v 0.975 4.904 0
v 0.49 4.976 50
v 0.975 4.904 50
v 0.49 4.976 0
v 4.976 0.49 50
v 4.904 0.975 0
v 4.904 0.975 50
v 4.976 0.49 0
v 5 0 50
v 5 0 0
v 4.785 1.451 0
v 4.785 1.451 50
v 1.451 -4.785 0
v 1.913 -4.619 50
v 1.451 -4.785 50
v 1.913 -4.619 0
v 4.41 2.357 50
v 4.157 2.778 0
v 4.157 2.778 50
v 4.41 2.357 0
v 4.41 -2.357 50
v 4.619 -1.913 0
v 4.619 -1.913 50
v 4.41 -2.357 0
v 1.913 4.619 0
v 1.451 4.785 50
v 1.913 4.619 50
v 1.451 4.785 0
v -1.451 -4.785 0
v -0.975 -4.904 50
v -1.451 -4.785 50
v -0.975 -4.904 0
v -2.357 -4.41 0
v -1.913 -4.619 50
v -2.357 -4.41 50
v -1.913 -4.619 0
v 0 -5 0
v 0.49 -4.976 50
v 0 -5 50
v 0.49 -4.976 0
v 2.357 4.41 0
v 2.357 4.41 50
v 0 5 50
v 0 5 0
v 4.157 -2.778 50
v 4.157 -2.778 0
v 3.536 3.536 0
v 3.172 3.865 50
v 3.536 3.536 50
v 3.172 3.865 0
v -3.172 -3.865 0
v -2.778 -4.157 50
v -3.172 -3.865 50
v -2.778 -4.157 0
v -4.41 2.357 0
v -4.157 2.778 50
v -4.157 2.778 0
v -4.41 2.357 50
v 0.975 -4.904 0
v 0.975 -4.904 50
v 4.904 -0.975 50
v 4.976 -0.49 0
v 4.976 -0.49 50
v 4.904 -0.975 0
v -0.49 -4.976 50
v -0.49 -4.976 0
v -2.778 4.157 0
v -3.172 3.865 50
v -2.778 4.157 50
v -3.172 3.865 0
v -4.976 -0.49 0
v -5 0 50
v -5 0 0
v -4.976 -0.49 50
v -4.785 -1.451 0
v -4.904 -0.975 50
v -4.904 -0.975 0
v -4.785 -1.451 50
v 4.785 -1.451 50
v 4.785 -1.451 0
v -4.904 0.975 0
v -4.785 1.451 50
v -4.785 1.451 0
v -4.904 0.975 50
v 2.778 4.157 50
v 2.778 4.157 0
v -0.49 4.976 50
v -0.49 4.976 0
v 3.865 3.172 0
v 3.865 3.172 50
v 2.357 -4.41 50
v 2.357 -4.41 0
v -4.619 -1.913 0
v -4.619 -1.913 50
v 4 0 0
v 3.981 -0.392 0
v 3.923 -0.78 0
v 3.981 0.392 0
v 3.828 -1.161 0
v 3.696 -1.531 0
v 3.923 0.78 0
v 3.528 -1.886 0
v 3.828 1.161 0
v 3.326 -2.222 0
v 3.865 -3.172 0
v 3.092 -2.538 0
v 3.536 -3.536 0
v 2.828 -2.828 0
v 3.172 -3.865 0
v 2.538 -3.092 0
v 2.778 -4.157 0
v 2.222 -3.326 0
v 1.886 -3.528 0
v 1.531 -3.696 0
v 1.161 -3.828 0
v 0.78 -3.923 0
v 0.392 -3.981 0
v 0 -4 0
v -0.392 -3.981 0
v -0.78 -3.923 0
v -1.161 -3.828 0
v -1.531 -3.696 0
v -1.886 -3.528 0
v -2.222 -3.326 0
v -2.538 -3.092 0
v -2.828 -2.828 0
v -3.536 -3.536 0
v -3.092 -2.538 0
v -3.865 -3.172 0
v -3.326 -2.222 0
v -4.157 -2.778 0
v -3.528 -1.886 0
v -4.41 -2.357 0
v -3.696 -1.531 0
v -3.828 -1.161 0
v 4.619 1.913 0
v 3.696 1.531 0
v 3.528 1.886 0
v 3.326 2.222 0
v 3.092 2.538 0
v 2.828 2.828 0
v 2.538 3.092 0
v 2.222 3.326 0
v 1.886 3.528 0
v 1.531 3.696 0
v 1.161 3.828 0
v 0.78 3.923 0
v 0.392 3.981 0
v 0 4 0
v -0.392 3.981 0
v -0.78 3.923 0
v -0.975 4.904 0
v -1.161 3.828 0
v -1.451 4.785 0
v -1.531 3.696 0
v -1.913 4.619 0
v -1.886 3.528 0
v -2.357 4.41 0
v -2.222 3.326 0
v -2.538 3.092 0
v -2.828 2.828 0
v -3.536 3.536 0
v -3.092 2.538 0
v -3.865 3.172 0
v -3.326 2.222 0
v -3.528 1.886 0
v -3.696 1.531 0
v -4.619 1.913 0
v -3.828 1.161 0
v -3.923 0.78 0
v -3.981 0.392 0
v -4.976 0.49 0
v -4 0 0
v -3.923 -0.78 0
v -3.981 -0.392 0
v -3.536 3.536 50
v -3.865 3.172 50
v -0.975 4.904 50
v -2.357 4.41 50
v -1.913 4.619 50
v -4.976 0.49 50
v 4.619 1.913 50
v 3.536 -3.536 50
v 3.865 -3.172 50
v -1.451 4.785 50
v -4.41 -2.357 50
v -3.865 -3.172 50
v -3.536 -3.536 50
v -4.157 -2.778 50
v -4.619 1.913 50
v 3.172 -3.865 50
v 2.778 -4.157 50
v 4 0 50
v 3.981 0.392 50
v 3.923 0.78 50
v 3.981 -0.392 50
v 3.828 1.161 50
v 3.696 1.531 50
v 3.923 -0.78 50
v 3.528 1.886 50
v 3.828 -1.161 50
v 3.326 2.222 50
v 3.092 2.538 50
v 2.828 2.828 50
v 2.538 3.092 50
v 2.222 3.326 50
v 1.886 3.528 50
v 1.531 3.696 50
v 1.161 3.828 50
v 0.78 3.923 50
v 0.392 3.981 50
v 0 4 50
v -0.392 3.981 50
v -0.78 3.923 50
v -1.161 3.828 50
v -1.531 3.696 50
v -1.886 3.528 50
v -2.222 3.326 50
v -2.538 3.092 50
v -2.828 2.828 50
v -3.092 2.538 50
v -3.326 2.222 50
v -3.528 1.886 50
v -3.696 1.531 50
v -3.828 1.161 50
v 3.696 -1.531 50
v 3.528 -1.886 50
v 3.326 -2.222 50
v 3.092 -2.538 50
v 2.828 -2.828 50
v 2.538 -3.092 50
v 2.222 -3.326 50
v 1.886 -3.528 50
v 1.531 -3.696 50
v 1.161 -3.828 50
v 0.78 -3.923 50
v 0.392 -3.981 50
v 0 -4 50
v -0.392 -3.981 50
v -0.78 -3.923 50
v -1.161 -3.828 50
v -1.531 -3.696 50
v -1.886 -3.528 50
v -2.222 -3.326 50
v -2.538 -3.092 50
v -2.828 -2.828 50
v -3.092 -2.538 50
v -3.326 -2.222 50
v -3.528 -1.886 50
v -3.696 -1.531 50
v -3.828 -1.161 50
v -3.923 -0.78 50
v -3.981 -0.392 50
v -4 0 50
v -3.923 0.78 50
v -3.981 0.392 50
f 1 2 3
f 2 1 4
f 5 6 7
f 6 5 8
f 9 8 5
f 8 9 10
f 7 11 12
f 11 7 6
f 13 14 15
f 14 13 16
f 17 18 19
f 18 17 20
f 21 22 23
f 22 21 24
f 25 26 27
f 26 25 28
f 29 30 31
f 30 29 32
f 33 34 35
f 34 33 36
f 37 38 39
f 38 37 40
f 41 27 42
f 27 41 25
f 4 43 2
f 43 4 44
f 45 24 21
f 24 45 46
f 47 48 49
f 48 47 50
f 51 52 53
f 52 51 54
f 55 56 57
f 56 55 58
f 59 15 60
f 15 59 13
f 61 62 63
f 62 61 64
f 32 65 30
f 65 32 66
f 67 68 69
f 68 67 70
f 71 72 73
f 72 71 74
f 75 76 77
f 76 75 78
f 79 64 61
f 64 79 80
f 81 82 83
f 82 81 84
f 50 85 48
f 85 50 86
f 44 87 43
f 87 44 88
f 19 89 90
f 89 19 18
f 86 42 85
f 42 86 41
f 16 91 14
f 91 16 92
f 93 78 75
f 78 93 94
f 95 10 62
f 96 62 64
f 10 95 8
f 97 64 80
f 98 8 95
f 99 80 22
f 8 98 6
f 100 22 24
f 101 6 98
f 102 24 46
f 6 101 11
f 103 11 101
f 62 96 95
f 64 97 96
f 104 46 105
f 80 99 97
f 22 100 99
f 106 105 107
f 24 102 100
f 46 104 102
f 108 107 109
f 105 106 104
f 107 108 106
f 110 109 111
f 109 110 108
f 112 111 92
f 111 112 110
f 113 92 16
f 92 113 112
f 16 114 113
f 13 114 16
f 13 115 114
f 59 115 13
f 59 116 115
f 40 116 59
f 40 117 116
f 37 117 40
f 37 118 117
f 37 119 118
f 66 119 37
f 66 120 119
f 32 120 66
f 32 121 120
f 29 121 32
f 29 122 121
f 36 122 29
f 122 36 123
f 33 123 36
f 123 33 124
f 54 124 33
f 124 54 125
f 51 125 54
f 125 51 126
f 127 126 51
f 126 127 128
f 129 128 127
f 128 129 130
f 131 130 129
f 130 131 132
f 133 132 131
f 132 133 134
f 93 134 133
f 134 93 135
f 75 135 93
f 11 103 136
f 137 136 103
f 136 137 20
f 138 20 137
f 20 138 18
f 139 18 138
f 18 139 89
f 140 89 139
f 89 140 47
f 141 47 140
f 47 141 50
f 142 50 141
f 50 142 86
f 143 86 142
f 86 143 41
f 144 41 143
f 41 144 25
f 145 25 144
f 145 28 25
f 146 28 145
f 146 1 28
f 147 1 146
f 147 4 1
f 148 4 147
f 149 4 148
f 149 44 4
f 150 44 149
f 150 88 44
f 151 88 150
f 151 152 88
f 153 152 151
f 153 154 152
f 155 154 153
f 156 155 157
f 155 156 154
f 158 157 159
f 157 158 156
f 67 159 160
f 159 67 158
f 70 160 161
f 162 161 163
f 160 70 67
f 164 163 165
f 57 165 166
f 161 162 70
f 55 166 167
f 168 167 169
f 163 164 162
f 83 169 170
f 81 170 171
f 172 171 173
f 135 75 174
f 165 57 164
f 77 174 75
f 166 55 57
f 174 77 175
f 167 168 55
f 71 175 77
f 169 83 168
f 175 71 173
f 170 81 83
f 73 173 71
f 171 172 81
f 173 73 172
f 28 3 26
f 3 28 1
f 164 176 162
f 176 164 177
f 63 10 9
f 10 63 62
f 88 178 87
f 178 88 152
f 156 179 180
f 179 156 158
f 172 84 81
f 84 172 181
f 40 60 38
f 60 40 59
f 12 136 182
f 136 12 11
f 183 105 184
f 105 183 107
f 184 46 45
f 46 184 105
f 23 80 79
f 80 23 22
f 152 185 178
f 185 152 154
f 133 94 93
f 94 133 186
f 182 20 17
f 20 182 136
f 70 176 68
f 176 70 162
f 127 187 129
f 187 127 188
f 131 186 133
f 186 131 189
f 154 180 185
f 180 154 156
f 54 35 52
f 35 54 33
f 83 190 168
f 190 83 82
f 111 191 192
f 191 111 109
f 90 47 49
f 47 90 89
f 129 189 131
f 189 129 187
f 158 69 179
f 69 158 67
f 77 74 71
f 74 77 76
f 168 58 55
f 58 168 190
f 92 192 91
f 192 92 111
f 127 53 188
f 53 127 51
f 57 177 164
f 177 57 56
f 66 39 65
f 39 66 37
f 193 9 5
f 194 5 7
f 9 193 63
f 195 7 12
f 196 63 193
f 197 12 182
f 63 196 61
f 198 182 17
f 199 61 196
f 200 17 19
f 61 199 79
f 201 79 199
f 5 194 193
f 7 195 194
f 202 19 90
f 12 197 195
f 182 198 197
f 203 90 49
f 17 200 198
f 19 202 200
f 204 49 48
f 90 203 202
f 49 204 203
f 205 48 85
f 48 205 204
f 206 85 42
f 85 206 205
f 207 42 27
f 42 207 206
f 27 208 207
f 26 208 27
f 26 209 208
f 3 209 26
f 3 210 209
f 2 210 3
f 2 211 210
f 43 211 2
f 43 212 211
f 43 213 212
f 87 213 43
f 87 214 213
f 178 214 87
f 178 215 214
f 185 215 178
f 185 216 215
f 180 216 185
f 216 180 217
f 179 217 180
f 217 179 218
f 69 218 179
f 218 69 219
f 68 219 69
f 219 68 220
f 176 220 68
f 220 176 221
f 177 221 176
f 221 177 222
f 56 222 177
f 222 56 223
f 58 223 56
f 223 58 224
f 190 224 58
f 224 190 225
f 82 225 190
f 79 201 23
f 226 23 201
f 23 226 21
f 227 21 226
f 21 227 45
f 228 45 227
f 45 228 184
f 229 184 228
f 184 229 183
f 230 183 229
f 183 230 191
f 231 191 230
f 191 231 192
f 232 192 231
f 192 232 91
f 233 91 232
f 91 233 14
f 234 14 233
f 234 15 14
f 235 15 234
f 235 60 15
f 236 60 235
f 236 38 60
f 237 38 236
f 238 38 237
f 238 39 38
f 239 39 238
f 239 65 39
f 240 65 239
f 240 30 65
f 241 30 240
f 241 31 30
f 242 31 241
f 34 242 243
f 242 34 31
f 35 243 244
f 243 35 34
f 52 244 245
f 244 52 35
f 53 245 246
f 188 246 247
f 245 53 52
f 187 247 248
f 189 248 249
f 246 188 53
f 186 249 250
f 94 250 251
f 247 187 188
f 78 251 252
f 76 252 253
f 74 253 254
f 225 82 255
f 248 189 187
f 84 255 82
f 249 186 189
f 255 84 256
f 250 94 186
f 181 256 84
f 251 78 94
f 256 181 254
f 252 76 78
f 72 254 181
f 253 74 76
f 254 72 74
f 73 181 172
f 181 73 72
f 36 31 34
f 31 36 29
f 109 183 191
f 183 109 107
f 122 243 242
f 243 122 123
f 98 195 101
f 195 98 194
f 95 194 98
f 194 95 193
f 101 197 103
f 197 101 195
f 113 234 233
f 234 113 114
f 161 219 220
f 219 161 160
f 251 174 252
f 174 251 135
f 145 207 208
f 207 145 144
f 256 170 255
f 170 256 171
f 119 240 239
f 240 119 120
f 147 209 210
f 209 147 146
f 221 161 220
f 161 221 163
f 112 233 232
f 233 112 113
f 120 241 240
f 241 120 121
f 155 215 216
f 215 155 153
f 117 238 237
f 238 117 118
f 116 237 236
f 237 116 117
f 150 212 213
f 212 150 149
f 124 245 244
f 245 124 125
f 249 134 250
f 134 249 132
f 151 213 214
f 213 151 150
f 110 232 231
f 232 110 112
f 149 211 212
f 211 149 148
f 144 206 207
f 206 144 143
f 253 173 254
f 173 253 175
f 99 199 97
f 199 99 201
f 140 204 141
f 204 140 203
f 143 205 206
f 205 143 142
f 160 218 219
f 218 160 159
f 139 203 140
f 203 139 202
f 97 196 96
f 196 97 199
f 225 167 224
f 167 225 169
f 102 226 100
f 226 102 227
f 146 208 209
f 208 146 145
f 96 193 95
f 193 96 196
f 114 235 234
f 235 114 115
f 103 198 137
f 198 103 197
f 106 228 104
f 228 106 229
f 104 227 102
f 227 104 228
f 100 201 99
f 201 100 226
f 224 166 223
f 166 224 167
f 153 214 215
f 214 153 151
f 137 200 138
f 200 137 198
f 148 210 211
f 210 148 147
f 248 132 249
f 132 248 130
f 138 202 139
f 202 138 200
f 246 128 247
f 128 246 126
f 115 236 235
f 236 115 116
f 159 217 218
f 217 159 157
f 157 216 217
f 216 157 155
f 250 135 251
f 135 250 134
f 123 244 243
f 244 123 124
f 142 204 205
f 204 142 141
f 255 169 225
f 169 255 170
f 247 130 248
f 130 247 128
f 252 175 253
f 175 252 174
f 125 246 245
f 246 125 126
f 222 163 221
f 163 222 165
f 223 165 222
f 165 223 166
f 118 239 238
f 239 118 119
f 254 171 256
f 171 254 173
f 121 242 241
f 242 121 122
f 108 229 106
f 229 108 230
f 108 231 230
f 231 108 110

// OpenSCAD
module heatshrink_sleeving(outer_diameter=10, thickness=1, length=50) {
    difference() {
        cylinder(h=length, d=outer_diameter, $fn=64);
        translate([0, 0, -1])
            cylinder(h=length + 2, d=outer_diameter - 2 * thickness, $fn=64);
    }
}

heatshrink_sleeving();
